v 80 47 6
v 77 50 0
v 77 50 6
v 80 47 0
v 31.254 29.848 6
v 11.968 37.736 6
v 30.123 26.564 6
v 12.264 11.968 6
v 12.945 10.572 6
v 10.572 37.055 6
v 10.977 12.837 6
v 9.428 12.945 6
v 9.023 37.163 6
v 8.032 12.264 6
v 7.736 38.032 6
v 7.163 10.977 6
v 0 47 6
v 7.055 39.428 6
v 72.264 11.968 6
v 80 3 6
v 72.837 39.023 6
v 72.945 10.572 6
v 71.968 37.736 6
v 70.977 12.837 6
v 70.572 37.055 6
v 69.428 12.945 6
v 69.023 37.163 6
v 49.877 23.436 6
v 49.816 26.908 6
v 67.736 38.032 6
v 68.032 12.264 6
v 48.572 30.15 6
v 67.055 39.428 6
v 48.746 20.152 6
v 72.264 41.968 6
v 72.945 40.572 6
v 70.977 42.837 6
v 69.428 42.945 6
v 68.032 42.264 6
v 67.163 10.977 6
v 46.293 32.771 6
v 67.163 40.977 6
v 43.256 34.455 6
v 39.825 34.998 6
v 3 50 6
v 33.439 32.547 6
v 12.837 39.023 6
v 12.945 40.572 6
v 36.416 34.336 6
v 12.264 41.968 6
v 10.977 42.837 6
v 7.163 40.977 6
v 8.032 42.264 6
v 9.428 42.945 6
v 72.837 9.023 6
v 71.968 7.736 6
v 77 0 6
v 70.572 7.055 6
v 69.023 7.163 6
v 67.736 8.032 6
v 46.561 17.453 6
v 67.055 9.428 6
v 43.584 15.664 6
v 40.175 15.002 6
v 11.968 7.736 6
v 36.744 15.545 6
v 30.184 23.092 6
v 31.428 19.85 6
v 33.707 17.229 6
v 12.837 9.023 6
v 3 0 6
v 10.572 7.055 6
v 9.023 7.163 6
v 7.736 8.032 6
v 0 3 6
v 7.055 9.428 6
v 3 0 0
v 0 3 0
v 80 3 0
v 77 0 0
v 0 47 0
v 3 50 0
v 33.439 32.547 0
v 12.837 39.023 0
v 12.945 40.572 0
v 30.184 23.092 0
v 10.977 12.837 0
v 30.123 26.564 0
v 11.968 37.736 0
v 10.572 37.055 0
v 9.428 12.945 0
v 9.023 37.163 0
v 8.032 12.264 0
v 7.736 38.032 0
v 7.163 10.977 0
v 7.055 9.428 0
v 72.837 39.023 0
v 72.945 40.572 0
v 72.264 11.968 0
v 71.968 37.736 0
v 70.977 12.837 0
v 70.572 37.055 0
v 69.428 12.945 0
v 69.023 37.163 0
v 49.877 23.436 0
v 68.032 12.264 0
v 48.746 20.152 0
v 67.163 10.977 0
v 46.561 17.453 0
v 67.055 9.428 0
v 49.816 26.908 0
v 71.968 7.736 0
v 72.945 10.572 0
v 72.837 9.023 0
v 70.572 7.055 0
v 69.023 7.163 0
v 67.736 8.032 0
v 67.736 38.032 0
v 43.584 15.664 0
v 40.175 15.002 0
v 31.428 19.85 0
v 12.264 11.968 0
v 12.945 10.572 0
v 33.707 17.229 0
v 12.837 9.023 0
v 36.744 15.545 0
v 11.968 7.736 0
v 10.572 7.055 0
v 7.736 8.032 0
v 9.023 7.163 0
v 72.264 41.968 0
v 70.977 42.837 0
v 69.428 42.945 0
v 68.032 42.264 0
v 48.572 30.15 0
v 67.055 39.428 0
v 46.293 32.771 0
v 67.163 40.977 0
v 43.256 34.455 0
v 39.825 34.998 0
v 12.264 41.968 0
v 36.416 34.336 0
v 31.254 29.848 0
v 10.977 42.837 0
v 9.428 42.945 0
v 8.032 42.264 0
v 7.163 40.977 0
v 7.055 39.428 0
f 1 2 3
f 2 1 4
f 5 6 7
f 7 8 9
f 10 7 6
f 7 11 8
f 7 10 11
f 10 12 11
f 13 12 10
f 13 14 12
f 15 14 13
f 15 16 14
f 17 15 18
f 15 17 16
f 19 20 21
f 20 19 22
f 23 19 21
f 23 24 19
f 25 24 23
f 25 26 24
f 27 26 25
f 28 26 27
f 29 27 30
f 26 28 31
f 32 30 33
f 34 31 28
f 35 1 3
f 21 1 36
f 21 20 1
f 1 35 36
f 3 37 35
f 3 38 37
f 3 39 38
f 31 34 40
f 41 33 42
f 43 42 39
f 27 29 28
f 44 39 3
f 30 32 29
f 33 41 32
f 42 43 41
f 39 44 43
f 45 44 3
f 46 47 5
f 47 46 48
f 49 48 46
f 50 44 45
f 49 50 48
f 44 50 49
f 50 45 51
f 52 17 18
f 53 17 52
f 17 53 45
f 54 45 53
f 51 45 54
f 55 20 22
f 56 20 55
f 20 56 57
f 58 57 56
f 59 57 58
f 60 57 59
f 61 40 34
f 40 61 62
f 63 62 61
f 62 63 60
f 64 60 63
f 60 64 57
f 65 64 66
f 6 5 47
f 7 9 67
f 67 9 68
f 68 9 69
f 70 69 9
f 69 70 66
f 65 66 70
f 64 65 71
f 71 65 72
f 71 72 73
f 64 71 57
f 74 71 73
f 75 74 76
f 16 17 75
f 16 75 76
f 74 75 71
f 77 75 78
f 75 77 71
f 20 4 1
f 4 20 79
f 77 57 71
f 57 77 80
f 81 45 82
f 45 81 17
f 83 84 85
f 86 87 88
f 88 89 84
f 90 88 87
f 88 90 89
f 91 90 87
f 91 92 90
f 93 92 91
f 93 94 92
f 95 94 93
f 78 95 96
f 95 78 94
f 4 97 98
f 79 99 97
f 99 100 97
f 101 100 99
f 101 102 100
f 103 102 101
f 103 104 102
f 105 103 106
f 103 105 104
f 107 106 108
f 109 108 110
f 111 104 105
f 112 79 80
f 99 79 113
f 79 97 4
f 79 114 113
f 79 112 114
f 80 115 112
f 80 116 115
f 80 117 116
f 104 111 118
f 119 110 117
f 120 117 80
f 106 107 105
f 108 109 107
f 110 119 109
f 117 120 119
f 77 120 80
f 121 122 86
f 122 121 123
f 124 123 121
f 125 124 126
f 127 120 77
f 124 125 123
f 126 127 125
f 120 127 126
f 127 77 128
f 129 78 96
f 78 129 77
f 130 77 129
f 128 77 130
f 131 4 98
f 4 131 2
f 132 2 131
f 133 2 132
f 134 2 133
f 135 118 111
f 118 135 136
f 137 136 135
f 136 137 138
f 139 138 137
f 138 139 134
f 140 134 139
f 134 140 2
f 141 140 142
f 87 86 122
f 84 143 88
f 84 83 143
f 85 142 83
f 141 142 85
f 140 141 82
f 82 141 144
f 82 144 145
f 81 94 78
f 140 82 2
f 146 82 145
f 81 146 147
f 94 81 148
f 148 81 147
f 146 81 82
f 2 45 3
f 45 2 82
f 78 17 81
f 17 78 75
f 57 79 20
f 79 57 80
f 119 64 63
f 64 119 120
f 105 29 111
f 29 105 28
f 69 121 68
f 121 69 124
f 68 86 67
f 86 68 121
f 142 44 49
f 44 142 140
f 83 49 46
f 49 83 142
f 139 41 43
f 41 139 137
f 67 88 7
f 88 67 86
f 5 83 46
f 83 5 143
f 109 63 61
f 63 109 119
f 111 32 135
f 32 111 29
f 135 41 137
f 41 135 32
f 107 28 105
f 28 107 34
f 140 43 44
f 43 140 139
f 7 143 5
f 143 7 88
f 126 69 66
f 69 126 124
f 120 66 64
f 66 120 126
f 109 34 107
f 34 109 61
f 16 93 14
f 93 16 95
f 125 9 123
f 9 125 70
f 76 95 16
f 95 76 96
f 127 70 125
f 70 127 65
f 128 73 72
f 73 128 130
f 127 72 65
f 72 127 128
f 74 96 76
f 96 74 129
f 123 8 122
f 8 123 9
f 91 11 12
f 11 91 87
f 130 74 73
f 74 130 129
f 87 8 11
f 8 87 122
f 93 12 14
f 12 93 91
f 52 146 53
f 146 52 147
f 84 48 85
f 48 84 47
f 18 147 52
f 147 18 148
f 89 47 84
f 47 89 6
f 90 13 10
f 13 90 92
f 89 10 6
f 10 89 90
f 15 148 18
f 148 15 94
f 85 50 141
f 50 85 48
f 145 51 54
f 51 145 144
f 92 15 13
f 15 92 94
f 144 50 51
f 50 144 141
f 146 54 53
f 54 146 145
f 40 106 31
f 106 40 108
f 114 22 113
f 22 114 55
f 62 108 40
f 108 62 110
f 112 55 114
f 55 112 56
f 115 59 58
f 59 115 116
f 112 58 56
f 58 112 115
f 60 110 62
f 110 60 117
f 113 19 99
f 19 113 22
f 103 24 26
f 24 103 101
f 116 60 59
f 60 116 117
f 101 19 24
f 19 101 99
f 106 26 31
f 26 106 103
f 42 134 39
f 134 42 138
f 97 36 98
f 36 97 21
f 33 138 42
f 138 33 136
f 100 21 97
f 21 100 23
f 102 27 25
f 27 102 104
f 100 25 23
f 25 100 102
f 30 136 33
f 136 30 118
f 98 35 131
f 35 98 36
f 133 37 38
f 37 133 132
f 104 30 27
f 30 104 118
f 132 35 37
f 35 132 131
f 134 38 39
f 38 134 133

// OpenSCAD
$fn = 32;

// ----------------------------------------------------------------------
// Spacer plate: rect 80 x 50
// ----------------------------------------------------------------------

// --- parameters (mm) ---
bore_r = 10;              // centre bore radius
bolt_r = 3;               // bolt hole radius
plate_t = 6;              // plate thickness, Z (extrusion height)
plate_l = 80;             // plate length, X
plate_w = 50;             // plate width, Y
inset = 10;               // corner hole inset
fit_tol = 0.05;           // declared fit tolerance (prompt contract)
free_tol = 0.3;           // declared free tolerance (prompt contract)

profile = [[3, 0], [77, 0], [80, 3], [80, 47], [77, 50], [3, 50], [0, 47], [0, 3]];  // primary outline, 8 points, counter clockwise
void_1 = [[49.816, 26.908], [48.572, 30.15], [46.293, 32.771], [43.256, 34.455], [39.825, 34.998], [36.416, 34.336], [33.439, 32.547], [31.254, 29.848], [30.123, 26.564], [30.184, 23.092], [31.428, 19.85], [33.707, 17.229], [36.744, 15.545], [40.175, 15.002], [43.584, 15.664], [46.561, 17.453], [48.746, 20.152], [49.877, 23.436]];  // centre bore, 18 points
void_2 = [[12.945, 10.572], [12.264, 11.968], [10.977, 12.837], [9.428, 12.945], [8.032, 12.264], [7.163, 10.977], [7.055, 9.428], [7.736, 8.032], [9.023, 7.163], [10.572, 7.055], [11.968, 7.736], [12.837, 9.023]];  // corner hole, 12 points
void_3 = [[12.945, 40.572], [12.264, 41.968], [10.977, 42.837], [9.428, 42.945], [8.032, 42.264], [7.163, 40.977], [7.055, 39.428], [7.736, 38.032], [9.023, 37.163], [10.572, 37.055], [11.968, 37.736], [12.837, 39.023]];  // corner hole, 12 points
void_4 = [[72.945, 10.572], [72.264, 11.968], [70.977, 12.837], [69.428, 12.945], [68.032, 12.264], [67.163, 10.977], [67.055, 9.428], [67.736, 8.032], [69.023, 7.163], [70.572, 7.055], [71.968, 7.736], [72.837, 9.023]];  // corner hole, 12 points
void_5 = [[72.945, 40.572], [72.264, 41.968], [70.977, 42.837], [69.428, 42.945], [68.032, 42.264], [67.163, 40.977], [67.055, 39.428], [67.736, 38.032], [69.023, 37.163], [70.572, 37.055], [71.968, 37.736], [72.837, 39.023]];  // corner hole, 12 points

// --- the one profile operation ---
difference() {
  linear_extrude(height = plate_t) polygon(points = profile);
  translate([0, 0, -1])
    linear_extrude(height = plate_t + 2) polygon(points = void_1);
  translate([0, 0, -1])
    linear_extrude(height = plate_t + 2) polygon(points = void_2);
  translate([0, 0, -1])
    linear_extrude(height = plate_t + 2) polygon(points = void_3);
  translate([0, 0, -1])
    linear_extrude(height = plate_t + 2) polygon(points = void_4);
  translate([0, 0, -1])
    linear_extrude(height = plate_t + 2) polygon(points = void_5);
}
